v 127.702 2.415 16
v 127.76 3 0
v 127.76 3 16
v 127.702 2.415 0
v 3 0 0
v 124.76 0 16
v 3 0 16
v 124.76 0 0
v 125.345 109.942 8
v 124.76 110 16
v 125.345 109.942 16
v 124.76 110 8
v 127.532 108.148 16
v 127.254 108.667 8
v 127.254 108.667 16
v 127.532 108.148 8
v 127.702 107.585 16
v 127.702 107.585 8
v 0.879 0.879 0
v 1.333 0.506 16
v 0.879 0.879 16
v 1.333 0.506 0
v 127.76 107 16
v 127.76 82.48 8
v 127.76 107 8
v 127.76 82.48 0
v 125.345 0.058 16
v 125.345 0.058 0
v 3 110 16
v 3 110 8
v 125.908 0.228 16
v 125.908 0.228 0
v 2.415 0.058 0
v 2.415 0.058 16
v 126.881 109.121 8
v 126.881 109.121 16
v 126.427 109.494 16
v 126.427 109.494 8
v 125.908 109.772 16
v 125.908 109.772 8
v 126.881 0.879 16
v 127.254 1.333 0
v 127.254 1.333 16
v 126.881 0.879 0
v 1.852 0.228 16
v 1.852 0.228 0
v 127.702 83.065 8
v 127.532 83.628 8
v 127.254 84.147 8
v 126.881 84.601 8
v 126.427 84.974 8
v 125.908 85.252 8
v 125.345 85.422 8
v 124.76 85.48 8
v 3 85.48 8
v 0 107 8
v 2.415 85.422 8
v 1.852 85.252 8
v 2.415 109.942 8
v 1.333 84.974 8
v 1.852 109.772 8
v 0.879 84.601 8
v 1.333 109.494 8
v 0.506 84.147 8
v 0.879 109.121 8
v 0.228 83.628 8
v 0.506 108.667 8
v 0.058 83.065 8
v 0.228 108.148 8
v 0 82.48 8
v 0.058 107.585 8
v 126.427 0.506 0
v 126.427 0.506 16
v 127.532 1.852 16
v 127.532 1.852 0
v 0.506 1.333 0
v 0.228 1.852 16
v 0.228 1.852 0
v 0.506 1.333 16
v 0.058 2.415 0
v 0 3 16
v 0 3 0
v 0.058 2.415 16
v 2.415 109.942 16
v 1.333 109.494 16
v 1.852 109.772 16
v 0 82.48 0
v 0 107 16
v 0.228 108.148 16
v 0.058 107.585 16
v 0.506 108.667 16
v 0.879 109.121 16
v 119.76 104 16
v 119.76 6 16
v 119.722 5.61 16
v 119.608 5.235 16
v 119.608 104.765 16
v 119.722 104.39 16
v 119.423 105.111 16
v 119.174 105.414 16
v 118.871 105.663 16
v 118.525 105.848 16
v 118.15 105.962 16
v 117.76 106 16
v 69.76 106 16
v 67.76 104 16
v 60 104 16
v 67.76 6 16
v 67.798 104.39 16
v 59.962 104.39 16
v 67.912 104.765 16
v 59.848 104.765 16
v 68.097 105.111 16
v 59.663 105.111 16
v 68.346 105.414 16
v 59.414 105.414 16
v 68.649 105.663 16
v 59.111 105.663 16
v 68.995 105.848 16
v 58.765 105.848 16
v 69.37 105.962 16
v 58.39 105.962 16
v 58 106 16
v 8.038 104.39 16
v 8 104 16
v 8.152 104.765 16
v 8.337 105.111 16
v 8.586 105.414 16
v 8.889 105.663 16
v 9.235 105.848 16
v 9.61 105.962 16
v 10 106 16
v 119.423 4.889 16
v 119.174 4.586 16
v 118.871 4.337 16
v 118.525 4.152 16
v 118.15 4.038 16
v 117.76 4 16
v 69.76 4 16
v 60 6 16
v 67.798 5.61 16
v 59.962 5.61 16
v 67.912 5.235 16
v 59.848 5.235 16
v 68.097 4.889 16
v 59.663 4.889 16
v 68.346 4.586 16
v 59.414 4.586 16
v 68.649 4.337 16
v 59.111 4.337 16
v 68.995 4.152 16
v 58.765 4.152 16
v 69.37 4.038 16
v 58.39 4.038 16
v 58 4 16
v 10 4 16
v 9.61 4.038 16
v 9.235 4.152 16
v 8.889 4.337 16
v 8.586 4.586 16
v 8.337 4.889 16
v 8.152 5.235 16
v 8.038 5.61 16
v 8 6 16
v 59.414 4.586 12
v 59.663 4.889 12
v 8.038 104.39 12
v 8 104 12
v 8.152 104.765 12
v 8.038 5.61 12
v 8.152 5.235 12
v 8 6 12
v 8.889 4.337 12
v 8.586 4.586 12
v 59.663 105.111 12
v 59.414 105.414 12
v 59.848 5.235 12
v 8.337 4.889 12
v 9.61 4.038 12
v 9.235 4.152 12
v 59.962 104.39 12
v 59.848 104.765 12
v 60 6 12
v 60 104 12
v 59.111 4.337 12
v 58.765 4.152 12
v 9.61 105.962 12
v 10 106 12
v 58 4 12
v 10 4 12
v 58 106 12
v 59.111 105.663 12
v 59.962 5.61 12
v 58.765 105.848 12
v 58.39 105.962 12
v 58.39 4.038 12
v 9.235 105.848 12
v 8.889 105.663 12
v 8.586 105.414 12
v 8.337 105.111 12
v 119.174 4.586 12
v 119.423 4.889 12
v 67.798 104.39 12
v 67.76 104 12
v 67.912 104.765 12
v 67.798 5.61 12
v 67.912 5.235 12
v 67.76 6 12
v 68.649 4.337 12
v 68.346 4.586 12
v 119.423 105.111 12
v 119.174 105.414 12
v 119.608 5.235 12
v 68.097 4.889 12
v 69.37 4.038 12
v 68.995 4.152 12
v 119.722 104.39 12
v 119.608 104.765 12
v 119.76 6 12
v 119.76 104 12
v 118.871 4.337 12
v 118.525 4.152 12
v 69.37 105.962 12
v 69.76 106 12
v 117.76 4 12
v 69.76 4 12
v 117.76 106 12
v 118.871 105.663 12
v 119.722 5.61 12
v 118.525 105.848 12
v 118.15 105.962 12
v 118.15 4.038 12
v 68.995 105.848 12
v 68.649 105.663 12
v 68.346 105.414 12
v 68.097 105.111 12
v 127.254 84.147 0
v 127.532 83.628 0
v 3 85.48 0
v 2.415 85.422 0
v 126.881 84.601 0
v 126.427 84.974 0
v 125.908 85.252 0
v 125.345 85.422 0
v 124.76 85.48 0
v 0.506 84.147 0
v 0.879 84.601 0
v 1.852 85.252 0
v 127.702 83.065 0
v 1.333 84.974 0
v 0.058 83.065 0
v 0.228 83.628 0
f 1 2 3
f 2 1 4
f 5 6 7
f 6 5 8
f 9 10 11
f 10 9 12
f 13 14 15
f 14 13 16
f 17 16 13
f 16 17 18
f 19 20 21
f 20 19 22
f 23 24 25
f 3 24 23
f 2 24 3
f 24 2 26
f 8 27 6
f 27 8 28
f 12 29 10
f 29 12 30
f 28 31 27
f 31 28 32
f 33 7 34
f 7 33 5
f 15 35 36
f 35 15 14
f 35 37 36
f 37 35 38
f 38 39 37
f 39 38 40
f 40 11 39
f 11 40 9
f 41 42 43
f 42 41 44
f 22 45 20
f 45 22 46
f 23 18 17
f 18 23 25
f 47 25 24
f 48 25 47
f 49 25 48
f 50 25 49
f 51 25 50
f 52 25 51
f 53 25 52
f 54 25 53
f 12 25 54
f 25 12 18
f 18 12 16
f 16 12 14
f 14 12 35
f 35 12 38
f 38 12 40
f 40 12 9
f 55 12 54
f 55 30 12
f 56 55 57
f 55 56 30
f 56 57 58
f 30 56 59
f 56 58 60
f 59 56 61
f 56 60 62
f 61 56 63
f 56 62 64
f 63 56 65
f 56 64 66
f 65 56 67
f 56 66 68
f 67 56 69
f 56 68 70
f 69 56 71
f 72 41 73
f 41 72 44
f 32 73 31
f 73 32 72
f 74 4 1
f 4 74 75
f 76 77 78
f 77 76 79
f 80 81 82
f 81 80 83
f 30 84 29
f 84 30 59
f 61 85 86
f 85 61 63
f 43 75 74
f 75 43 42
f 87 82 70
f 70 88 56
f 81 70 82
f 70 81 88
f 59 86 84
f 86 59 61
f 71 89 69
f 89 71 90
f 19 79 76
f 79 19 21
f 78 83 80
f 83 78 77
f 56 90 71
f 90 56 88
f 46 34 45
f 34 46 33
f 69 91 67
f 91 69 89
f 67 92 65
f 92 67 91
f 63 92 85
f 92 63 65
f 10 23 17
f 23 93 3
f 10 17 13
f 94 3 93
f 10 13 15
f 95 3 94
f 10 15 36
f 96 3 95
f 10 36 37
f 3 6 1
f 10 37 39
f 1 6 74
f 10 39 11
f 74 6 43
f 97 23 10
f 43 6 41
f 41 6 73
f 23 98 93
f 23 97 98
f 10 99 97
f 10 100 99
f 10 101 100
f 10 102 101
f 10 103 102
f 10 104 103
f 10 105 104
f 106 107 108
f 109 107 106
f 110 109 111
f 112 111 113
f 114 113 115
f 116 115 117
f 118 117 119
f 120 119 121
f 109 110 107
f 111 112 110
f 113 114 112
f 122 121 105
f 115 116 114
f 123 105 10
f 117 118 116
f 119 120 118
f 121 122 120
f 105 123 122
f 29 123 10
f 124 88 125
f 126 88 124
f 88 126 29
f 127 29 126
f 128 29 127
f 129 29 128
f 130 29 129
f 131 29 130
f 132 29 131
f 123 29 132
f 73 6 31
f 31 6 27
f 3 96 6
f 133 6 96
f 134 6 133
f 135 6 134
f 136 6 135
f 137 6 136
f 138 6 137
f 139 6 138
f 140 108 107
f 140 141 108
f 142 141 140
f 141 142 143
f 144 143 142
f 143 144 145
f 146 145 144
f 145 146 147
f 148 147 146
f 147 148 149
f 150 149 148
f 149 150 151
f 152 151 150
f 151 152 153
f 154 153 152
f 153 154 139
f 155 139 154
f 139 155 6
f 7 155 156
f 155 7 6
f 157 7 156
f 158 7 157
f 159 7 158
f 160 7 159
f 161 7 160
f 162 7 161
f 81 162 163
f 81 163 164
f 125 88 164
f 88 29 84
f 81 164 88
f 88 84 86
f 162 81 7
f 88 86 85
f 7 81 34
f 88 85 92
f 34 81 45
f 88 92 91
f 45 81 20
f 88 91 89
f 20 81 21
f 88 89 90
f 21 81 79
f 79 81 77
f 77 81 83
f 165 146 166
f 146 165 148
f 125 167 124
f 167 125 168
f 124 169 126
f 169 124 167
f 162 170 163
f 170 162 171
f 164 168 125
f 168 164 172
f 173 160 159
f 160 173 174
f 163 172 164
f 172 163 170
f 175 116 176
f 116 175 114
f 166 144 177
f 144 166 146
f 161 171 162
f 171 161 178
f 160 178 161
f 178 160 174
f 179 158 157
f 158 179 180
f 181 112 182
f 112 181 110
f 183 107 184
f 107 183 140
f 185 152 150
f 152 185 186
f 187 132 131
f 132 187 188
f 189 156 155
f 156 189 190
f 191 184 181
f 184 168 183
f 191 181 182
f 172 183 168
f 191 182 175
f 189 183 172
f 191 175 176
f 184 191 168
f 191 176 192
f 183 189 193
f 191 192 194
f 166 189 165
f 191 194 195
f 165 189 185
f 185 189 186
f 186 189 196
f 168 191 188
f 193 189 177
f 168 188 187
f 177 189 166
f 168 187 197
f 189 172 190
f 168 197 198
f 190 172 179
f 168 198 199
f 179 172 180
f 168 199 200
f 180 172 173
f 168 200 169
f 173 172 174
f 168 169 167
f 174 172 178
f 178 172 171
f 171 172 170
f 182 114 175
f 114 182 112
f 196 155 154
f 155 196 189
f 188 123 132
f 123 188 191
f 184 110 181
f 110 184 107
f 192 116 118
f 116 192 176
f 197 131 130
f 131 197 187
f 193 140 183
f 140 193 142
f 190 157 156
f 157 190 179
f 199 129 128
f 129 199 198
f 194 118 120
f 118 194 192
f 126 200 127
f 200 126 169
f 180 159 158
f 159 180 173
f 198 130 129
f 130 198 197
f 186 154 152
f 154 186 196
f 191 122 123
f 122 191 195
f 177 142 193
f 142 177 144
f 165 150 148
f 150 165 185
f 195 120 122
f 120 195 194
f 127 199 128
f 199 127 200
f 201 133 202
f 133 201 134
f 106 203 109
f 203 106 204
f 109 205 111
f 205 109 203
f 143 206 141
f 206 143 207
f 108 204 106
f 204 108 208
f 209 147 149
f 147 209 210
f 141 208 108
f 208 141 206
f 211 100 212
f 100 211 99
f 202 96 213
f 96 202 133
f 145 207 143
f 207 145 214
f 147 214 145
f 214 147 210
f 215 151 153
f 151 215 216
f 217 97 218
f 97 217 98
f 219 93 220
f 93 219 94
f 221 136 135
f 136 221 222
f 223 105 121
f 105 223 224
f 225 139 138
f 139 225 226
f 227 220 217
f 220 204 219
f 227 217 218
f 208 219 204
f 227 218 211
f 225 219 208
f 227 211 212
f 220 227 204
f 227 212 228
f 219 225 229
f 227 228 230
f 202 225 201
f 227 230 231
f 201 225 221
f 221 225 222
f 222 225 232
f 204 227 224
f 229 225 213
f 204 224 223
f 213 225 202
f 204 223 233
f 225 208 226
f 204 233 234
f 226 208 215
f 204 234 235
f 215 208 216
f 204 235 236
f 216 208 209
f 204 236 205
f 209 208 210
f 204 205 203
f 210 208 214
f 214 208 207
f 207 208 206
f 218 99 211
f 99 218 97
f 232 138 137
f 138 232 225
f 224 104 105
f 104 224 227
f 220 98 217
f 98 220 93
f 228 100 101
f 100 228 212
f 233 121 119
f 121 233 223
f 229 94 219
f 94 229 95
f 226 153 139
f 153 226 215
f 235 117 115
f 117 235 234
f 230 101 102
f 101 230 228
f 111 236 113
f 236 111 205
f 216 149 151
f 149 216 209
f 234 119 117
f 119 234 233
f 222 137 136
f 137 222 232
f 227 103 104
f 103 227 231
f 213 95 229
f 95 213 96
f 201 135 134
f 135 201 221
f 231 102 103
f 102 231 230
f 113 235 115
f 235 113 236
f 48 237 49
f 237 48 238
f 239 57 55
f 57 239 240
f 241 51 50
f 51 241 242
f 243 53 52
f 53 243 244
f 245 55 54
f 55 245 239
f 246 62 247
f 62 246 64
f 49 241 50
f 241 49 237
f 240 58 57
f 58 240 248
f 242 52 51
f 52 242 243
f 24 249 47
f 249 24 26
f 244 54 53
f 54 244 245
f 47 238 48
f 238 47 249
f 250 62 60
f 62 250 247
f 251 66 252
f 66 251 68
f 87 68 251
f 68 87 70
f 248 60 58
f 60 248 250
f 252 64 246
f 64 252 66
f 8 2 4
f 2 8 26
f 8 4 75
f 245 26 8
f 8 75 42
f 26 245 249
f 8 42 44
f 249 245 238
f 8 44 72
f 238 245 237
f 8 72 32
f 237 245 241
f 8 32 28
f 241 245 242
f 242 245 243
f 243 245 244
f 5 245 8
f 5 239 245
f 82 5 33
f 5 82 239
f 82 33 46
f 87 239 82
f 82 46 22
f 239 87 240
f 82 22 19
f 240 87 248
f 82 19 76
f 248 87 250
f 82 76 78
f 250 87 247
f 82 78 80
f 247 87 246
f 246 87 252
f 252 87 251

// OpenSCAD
// Opentrons 10ml Reservoir Holder
// Two-level design with dual reservoir cutouts

// Base dimensions (sits on Opentrons deck)
base_width = 127.76;
base_depth = 85.48;
base_height = 8;
base_corner_radius = 3;

// Platform dimensions (sits on top of base)
platform_width = 127.76;
platform_depth = 110;
platform_height = 8;
platform_corner_radius = 3;

// Cutout dimensions
cutout_width = 52;
cutout_depth = 102;
cutout_height = 4;
cutout_corner_radius = 2;
cutout_inset = 8;  // distance from outside edge in width axis

module rounded_rect(width, depth, height, radius) {
    hull() {
        for (x = [radius, width - radius]) {
            for (y = [radius, depth - radius]) {
                translate([x, y, 0])
                    cylinder(h = height, r = radius, $fn = 32);
            }
        }
    }
}

// Base
rounded_rect(base_width, base_depth, base_height, base_corner_radius);

// Platform with cutouts
difference() {
    // Platform on top of base
    translate([0, 0, base_height])
        rounded_rect(platform_width, platform_depth, platform_height, platform_corner_radius);

    // Cutout 1 (left side)
    translate([
        cutout_inset,
        (platform_depth - cutout_depth) / 2,
        base_height + platform_height - cutout_height
    ])
        rounded_rect(cutout_width, cutout_depth, cutout_height + 1, cutout_corner_radius);

    // Cutout 2 (right side)
    translate([
        platform_width - cutout_inset - cutout_width,
        (platform_depth - cutout_depth) / 2,
        base_height + platform_height - cutout_height
    ])
        rounded_rect(cutout_width, cutout_depth, cutout_height + 1, cutout_corner_radius);
}
